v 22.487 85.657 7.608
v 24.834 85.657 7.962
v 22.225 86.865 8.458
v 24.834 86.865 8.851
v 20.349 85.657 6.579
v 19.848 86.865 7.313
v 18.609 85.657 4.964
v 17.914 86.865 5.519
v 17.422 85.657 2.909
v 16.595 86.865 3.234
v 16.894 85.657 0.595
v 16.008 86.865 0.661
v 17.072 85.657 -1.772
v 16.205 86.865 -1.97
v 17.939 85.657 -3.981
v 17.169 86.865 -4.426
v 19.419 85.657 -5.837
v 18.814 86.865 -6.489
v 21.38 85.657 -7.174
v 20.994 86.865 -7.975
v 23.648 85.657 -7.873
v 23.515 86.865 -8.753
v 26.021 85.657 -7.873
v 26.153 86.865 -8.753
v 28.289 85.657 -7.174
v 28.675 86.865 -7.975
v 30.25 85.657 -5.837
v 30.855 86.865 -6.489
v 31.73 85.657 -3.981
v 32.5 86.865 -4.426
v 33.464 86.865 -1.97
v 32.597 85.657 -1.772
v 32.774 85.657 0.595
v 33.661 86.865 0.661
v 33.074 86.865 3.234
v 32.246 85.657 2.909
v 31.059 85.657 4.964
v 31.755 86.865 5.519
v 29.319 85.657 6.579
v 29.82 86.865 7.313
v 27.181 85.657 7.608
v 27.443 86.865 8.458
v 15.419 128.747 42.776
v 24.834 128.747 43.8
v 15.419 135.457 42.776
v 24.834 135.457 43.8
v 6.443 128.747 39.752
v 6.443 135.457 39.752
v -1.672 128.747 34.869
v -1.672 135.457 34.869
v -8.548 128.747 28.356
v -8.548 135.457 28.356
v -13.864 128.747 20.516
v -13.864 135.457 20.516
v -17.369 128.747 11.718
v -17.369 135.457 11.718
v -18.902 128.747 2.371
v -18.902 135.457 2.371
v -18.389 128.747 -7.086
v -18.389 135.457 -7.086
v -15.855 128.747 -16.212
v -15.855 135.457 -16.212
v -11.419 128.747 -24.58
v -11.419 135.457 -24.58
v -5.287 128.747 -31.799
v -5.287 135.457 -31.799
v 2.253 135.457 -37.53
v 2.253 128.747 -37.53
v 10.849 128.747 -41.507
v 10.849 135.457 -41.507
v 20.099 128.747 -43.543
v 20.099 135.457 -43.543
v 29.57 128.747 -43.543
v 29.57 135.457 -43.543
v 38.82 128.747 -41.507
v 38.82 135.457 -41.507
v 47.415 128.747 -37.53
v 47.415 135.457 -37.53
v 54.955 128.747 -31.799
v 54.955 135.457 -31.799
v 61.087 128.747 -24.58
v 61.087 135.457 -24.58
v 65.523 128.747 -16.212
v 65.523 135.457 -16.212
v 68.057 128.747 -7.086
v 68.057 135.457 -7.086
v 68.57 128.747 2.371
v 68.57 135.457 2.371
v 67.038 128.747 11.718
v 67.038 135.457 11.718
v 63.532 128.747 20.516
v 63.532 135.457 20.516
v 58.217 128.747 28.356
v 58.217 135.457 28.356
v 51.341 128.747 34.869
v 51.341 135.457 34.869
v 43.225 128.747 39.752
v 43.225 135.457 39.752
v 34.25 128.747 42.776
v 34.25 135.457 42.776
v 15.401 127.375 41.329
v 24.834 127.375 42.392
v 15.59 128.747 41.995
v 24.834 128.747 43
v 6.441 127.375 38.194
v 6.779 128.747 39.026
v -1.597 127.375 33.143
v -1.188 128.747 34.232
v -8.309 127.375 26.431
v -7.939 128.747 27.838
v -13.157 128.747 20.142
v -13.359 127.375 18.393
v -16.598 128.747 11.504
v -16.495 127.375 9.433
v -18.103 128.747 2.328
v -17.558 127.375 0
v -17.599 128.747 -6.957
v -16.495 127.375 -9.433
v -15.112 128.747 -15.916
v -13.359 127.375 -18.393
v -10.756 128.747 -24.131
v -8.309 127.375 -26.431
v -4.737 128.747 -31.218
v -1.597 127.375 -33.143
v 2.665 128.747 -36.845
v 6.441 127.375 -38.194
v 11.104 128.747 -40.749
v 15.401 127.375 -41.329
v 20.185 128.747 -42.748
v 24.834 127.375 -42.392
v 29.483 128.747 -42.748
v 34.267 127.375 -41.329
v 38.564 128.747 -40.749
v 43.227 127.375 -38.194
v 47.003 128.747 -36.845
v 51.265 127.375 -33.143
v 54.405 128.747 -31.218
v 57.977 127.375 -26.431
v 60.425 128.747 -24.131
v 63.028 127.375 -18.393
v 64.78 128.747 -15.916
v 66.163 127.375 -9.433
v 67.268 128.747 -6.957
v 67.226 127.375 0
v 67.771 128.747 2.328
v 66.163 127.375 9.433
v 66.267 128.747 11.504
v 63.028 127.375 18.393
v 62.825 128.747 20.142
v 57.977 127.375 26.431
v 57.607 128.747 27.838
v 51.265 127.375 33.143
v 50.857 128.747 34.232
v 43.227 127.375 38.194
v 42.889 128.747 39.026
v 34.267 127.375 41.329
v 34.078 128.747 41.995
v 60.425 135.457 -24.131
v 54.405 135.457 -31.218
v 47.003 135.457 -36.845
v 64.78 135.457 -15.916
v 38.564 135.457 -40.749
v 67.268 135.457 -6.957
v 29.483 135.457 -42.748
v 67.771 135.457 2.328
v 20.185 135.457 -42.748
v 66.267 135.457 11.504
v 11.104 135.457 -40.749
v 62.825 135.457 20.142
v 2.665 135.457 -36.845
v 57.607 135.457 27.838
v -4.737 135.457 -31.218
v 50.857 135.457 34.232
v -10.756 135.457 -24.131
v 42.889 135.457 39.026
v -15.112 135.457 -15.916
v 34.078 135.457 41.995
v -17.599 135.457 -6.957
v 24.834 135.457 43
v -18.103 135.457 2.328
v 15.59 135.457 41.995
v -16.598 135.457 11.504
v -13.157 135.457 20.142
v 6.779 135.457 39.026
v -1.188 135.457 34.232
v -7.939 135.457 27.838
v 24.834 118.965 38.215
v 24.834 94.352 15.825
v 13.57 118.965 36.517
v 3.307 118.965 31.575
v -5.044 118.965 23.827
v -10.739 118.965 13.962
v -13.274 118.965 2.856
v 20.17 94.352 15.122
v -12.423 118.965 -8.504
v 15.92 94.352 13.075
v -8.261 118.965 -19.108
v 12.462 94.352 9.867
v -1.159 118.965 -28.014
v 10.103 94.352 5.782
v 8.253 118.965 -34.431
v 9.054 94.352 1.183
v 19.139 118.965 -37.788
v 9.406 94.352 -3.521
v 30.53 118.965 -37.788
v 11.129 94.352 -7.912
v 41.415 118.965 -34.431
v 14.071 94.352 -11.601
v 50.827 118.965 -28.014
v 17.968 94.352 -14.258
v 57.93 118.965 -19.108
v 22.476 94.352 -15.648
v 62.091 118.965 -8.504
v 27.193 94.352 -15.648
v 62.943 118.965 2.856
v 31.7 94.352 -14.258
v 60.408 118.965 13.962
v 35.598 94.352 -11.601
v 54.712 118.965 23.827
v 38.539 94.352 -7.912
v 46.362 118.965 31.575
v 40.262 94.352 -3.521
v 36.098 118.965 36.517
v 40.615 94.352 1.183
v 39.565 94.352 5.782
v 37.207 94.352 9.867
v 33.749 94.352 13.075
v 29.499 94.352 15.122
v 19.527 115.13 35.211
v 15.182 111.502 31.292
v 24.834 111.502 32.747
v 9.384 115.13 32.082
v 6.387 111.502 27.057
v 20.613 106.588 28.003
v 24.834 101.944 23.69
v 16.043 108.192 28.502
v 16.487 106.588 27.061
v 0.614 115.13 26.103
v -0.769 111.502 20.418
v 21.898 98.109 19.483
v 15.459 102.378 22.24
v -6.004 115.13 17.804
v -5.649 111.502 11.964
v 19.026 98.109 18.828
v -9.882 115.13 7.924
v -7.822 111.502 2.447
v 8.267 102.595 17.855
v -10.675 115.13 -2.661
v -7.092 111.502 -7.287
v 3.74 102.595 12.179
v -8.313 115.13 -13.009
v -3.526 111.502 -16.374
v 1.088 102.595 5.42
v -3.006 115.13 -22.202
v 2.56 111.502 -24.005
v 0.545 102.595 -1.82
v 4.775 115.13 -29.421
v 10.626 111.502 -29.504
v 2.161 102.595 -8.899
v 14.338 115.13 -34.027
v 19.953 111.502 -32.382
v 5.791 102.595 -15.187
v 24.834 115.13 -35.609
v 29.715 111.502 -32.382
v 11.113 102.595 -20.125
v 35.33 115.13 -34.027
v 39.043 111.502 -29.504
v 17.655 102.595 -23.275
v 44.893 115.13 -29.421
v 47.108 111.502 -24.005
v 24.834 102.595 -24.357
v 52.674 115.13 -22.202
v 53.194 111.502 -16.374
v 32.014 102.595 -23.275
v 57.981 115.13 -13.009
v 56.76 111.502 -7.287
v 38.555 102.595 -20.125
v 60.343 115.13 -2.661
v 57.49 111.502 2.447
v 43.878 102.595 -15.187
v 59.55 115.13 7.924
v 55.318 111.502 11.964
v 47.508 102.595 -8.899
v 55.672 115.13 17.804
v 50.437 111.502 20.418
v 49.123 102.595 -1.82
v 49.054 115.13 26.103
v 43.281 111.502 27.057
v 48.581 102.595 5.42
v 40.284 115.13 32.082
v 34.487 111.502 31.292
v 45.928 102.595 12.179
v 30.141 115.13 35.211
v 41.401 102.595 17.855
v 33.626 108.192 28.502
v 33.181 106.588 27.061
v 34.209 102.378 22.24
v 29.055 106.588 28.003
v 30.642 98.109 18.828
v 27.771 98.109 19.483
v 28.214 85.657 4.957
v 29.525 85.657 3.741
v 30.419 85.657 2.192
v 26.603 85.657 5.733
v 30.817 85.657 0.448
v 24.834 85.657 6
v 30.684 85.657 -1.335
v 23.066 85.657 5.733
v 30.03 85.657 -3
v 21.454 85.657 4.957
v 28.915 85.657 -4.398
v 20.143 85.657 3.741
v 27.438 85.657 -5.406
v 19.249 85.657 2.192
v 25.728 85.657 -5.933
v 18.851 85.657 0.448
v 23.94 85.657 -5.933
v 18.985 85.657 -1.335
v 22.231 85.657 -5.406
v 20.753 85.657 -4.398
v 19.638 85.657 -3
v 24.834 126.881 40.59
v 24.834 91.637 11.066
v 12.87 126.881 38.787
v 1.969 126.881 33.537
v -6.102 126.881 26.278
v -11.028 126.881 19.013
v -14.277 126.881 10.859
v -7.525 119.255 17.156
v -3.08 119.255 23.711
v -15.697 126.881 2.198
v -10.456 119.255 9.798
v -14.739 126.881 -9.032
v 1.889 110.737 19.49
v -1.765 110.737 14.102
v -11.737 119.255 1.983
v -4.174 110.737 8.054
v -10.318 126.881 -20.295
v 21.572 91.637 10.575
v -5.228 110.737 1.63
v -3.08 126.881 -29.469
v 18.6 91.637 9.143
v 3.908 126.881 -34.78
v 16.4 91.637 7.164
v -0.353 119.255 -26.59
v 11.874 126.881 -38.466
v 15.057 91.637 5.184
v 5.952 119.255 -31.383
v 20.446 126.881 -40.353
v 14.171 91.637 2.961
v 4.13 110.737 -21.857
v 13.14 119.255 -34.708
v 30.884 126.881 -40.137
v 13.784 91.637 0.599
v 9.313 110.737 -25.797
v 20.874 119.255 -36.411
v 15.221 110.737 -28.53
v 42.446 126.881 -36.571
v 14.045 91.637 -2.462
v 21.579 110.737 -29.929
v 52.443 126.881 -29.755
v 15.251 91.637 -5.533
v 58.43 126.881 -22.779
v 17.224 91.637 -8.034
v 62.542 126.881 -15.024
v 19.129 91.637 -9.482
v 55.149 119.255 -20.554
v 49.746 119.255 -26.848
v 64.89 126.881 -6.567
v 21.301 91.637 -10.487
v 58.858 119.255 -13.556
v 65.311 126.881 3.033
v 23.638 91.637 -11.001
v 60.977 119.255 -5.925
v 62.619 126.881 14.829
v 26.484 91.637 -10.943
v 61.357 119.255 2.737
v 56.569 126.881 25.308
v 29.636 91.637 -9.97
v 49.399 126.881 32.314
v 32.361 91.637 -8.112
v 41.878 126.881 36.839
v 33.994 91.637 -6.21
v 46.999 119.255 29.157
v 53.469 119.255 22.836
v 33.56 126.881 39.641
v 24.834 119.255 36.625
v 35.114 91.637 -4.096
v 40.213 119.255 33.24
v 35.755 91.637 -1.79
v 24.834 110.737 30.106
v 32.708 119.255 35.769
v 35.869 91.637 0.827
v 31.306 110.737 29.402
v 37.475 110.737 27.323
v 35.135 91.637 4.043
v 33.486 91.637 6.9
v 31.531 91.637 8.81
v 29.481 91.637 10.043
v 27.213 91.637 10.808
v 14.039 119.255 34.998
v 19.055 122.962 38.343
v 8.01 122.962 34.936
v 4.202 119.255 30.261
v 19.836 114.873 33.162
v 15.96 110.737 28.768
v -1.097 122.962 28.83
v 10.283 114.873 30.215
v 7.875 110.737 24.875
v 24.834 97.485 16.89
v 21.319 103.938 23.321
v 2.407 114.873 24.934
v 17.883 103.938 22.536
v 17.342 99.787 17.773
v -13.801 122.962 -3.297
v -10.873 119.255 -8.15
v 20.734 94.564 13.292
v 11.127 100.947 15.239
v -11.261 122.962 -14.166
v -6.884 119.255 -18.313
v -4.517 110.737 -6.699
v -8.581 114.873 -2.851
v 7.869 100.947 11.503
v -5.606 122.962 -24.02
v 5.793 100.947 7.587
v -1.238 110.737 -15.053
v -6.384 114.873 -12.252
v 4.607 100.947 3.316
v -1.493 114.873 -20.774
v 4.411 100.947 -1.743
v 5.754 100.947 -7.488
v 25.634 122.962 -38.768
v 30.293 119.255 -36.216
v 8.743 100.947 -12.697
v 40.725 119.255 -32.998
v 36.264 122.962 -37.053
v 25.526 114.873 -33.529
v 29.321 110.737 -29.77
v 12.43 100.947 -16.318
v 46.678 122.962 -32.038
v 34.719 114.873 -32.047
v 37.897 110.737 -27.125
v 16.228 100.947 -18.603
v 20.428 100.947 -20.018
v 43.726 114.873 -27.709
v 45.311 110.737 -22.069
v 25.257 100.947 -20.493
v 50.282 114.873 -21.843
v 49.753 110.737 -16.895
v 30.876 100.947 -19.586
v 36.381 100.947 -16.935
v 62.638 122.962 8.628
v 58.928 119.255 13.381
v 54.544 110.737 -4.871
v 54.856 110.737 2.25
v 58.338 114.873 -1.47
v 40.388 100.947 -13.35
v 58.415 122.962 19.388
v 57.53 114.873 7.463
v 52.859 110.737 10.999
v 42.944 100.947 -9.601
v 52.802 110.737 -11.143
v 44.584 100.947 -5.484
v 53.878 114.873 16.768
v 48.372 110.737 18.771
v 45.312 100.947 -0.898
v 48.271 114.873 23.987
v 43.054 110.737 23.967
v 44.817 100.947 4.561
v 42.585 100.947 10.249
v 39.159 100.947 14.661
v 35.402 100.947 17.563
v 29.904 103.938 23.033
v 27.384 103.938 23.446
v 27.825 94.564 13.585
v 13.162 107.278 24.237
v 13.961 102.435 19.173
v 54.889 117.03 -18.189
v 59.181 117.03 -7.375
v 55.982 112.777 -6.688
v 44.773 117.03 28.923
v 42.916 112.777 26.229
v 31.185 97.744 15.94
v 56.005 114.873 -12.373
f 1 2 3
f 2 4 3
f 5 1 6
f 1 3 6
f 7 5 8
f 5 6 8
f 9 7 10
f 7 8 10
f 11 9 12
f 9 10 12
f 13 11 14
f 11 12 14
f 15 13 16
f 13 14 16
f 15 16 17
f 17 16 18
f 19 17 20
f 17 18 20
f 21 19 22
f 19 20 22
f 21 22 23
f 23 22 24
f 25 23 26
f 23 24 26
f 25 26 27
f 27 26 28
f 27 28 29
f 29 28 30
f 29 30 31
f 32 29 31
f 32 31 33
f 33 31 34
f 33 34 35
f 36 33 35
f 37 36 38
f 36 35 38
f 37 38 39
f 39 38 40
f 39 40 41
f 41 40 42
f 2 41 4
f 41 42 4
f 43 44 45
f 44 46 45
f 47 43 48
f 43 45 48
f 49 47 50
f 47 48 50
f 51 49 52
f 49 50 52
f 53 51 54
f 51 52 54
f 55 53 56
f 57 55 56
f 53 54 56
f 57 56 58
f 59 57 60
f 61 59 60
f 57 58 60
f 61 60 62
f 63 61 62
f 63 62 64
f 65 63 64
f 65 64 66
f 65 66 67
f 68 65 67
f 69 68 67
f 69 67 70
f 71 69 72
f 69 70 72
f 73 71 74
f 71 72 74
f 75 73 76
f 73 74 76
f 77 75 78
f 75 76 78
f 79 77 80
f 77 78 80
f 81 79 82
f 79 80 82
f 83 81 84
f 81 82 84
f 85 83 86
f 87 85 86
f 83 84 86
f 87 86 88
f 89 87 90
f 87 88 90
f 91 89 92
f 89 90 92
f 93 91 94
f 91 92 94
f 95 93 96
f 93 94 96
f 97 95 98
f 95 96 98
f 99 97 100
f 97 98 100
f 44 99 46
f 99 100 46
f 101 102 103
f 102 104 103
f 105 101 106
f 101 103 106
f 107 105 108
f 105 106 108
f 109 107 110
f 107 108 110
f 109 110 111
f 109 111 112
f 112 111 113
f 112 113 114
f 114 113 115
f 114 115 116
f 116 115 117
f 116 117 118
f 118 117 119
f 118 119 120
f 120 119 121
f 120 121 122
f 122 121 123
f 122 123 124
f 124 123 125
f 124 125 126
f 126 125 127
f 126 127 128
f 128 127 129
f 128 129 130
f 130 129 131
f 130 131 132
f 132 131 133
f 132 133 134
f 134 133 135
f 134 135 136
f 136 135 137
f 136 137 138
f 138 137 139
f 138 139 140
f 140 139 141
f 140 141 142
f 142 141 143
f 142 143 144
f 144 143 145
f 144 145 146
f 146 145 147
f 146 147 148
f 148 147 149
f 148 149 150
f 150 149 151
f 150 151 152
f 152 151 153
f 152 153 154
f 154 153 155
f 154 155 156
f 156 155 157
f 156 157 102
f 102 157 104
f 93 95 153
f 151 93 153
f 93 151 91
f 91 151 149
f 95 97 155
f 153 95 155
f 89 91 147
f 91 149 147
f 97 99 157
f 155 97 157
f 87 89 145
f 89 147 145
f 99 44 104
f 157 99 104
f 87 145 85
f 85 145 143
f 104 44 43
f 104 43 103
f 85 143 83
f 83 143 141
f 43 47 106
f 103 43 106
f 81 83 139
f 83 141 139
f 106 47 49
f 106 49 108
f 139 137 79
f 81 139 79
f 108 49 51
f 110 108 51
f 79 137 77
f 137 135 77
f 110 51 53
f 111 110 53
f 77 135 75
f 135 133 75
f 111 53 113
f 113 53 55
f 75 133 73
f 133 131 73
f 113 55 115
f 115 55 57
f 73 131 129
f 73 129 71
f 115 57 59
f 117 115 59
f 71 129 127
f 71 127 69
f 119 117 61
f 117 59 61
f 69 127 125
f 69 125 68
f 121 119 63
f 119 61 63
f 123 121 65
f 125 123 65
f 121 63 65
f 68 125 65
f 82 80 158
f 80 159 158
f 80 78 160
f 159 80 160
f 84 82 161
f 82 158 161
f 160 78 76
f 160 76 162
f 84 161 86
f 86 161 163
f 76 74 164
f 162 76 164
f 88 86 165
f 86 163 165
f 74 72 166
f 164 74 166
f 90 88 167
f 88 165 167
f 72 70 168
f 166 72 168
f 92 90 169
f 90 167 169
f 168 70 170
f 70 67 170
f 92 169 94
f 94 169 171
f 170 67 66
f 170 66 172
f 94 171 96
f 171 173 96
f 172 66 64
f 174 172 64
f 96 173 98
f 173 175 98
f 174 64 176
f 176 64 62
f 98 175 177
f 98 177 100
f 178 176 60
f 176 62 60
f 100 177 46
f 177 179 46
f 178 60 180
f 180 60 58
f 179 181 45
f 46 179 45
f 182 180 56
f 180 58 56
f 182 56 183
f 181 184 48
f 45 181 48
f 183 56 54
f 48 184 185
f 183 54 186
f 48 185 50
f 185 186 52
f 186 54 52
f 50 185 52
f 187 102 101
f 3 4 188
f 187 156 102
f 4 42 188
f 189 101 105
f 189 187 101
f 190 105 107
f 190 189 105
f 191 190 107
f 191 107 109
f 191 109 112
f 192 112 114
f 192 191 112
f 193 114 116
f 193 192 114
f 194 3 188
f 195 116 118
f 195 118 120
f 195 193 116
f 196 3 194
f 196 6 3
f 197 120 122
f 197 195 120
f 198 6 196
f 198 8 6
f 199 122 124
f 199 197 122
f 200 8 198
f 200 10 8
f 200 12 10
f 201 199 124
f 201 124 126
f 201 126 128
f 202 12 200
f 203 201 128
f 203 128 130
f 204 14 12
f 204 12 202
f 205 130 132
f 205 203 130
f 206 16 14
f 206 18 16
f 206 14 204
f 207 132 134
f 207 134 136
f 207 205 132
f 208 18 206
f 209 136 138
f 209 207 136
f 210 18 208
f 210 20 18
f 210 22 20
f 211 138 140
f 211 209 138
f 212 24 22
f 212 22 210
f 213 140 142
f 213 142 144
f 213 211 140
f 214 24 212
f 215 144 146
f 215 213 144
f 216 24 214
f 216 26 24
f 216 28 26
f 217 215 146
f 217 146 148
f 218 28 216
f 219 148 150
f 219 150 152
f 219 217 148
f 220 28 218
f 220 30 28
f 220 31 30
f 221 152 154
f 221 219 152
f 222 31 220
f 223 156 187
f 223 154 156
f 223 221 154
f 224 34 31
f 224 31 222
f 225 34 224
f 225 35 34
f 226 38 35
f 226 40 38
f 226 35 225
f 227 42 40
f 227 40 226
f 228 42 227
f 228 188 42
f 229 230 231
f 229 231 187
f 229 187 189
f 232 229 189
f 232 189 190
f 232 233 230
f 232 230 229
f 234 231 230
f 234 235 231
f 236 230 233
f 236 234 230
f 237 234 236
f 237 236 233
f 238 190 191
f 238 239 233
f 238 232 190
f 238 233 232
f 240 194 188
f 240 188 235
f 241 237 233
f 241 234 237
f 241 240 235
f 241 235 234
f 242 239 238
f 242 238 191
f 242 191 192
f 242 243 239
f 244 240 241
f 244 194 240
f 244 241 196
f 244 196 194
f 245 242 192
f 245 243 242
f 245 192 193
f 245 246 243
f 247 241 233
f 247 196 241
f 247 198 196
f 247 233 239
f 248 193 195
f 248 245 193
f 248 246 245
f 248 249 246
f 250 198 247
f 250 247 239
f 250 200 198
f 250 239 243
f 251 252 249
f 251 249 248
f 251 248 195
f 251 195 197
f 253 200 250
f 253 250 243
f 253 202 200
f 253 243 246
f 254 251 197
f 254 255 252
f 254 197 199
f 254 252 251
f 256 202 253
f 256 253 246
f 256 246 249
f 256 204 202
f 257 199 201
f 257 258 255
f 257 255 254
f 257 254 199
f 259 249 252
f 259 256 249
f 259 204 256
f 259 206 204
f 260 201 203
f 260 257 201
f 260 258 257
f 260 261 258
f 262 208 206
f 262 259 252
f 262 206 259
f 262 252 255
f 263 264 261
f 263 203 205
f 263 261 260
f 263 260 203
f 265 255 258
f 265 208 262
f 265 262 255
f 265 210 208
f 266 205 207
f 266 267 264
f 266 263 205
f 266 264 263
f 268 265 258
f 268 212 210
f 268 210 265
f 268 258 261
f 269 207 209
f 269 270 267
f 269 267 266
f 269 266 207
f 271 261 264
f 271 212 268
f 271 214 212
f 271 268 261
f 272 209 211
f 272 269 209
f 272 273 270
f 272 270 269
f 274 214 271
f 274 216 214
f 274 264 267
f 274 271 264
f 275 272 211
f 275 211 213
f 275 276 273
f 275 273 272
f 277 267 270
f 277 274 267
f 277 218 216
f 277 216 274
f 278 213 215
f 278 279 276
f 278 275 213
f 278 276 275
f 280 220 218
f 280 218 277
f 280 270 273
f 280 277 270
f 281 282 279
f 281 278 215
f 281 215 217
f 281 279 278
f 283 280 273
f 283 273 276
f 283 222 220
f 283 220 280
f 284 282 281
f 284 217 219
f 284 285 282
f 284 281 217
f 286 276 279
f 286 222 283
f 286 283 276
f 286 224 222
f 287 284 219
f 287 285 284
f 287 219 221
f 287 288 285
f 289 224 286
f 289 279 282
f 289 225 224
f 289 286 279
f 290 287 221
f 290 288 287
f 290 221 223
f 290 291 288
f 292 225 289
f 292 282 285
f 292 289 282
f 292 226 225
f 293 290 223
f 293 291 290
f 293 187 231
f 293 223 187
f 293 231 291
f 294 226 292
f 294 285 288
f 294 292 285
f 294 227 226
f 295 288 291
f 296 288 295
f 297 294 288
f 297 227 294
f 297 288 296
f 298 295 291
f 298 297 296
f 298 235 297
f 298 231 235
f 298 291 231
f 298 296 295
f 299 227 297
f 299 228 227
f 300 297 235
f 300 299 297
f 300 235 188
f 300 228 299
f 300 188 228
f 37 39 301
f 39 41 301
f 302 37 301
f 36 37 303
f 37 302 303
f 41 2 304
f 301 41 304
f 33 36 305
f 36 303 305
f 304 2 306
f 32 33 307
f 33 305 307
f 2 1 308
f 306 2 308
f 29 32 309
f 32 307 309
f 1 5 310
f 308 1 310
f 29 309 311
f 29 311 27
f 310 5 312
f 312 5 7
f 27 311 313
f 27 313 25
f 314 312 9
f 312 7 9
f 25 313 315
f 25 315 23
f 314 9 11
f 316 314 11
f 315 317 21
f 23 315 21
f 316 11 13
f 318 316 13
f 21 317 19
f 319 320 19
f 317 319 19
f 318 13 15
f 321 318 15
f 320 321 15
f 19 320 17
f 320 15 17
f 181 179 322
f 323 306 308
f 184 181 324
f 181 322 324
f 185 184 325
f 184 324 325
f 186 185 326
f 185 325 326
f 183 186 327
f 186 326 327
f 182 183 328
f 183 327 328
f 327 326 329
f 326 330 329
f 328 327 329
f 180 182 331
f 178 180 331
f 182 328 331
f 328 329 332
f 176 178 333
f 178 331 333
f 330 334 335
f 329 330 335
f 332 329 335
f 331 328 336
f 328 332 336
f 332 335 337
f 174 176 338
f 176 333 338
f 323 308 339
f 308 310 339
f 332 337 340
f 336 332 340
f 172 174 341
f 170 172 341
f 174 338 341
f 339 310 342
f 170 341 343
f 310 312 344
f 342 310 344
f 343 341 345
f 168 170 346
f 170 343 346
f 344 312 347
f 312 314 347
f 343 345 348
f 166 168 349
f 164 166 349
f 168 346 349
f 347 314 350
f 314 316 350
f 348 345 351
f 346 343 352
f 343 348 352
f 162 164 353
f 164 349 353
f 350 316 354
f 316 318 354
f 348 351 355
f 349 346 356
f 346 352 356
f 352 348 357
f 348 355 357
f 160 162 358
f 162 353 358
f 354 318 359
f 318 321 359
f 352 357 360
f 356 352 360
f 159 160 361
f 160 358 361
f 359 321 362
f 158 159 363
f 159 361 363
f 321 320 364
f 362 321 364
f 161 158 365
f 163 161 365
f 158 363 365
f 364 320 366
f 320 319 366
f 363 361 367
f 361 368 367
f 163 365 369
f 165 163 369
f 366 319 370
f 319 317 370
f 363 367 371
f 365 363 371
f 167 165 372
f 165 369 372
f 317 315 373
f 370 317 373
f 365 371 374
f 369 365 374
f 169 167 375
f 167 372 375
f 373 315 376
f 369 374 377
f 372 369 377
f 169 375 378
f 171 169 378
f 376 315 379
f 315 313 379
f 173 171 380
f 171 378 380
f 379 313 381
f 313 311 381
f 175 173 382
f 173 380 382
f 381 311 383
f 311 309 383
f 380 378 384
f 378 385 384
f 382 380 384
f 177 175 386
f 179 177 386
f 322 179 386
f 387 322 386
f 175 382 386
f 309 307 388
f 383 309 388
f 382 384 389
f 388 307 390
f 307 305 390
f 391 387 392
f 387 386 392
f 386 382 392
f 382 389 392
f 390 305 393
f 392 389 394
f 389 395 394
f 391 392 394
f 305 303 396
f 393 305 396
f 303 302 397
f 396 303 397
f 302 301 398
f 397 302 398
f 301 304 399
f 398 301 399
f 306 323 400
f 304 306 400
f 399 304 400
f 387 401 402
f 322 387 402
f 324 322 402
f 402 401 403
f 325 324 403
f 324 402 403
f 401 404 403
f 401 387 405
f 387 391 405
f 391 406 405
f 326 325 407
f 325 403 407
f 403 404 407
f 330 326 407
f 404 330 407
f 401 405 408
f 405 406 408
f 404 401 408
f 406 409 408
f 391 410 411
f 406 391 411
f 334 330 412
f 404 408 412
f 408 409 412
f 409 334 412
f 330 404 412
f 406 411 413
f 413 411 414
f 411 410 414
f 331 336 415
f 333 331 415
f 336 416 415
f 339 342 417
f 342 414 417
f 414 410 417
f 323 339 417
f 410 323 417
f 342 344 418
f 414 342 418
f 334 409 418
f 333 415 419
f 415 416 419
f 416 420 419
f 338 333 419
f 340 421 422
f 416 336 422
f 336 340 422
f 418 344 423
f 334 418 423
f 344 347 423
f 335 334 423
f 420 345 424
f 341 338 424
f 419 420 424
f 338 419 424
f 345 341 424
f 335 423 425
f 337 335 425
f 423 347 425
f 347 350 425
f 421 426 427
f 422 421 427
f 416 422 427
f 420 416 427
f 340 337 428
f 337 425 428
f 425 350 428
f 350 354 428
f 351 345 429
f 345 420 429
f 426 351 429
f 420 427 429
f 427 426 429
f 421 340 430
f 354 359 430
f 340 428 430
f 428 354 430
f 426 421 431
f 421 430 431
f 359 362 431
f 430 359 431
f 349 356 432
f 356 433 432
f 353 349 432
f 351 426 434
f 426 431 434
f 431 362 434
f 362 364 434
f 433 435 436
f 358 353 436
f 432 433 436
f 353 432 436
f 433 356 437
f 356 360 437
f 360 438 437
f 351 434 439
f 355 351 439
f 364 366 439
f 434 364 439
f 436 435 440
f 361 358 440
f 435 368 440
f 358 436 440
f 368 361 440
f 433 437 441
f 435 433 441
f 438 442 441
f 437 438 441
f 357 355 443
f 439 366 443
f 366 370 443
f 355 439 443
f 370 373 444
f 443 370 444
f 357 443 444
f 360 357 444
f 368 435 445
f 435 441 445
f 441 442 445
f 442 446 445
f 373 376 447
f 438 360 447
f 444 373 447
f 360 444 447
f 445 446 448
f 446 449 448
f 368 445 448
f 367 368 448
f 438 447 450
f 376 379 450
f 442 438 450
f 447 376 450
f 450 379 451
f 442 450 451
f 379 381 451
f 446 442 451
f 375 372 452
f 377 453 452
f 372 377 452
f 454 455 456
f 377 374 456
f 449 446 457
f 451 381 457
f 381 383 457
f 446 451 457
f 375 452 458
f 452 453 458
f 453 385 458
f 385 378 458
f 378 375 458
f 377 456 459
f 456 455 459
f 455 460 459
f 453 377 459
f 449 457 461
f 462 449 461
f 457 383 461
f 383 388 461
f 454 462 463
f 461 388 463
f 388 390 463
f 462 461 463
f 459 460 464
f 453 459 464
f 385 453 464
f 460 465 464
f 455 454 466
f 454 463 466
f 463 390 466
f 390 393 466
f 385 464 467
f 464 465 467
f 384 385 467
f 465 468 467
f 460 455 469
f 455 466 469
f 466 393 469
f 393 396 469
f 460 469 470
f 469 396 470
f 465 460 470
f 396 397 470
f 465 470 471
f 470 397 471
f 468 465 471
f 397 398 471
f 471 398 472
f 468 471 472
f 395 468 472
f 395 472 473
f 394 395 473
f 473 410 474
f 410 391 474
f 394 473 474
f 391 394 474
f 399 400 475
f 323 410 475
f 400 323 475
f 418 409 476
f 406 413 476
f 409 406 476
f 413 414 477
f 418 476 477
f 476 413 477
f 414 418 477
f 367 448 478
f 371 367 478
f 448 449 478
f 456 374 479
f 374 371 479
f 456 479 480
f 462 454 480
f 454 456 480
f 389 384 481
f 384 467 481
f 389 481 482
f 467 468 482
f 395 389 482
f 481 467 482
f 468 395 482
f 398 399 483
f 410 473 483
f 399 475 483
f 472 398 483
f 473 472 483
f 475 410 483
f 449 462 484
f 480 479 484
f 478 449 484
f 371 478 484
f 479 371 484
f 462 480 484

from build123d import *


with BuildPart() as part:
    # Sketch1 → Revolve1 (revolve)
    with BuildSketch(Plane.XY, mode=Mode.PRIVATE) as revolve1_sk:
        with BuildLine():
            Line((18.834212464, 85.656528888), (16.872016179, 85.656528888))
            Line((16.872016179, 85.656528888), (15.982781636, 86.86452803))
            add(Edge.make_bspline(
                [(-17.557551318, 127.375382727), (-17.149252008, 126.282501553), (-16.237853417, 124.119682516), (-14.129979086, 120.024361387), (-9.75405026, 113.3263342), (-3.634824269, 106.585517876), (2.779766009, 100.345416982), (7.538915569, 95.819712917), (11.288948131, 92.106723437), (14.070545225, 89.115850224), (15.353268122, 87.629988), (15.982781636, 86.86452803)],
                knots=[0.117144833, 0.117144833, 0.117144833, 0.117144833, 0.169312009, 0.221479185, 0.325813538, 0.534482242, 0.638816594, 0.743150946, 0.847485298, 0.899652474, 0.95181965, 0.95181965, 0.95181965, 0.95181965], degree=3))
            Line((-17.557551318, 127.375382727), (-18.165787536, 128.746531407))
            Line((-18.165787536, 128.746531407), (-18.965787536, 128.746531407))
            Line((-18.965787536, 128.746531407), (-18.965787536, 135.456528888))
            Line((-18.965787536, 135.456528888), (-18.165787536, 135.456528888))
            add(Edge.make_bspline(
                [(-18.165787536, 135.456528888), (-14.45456026, 112.769537057), (7.622935344, 100.742541923), (18.834212464, 85.656528888)],
                knots=[0, 0, 0, 0, 1, 1, 1, 1], degree=3))
        make_face()
    revolve(revolve1_sk.sketch.rotate(Axis((24.834212464, 148.471380655, 0), (0, -1, 0)), 270), axis=Axis((24.834212464, 148.471380655, 0), (0, -1, 0)))


solid = part.part
